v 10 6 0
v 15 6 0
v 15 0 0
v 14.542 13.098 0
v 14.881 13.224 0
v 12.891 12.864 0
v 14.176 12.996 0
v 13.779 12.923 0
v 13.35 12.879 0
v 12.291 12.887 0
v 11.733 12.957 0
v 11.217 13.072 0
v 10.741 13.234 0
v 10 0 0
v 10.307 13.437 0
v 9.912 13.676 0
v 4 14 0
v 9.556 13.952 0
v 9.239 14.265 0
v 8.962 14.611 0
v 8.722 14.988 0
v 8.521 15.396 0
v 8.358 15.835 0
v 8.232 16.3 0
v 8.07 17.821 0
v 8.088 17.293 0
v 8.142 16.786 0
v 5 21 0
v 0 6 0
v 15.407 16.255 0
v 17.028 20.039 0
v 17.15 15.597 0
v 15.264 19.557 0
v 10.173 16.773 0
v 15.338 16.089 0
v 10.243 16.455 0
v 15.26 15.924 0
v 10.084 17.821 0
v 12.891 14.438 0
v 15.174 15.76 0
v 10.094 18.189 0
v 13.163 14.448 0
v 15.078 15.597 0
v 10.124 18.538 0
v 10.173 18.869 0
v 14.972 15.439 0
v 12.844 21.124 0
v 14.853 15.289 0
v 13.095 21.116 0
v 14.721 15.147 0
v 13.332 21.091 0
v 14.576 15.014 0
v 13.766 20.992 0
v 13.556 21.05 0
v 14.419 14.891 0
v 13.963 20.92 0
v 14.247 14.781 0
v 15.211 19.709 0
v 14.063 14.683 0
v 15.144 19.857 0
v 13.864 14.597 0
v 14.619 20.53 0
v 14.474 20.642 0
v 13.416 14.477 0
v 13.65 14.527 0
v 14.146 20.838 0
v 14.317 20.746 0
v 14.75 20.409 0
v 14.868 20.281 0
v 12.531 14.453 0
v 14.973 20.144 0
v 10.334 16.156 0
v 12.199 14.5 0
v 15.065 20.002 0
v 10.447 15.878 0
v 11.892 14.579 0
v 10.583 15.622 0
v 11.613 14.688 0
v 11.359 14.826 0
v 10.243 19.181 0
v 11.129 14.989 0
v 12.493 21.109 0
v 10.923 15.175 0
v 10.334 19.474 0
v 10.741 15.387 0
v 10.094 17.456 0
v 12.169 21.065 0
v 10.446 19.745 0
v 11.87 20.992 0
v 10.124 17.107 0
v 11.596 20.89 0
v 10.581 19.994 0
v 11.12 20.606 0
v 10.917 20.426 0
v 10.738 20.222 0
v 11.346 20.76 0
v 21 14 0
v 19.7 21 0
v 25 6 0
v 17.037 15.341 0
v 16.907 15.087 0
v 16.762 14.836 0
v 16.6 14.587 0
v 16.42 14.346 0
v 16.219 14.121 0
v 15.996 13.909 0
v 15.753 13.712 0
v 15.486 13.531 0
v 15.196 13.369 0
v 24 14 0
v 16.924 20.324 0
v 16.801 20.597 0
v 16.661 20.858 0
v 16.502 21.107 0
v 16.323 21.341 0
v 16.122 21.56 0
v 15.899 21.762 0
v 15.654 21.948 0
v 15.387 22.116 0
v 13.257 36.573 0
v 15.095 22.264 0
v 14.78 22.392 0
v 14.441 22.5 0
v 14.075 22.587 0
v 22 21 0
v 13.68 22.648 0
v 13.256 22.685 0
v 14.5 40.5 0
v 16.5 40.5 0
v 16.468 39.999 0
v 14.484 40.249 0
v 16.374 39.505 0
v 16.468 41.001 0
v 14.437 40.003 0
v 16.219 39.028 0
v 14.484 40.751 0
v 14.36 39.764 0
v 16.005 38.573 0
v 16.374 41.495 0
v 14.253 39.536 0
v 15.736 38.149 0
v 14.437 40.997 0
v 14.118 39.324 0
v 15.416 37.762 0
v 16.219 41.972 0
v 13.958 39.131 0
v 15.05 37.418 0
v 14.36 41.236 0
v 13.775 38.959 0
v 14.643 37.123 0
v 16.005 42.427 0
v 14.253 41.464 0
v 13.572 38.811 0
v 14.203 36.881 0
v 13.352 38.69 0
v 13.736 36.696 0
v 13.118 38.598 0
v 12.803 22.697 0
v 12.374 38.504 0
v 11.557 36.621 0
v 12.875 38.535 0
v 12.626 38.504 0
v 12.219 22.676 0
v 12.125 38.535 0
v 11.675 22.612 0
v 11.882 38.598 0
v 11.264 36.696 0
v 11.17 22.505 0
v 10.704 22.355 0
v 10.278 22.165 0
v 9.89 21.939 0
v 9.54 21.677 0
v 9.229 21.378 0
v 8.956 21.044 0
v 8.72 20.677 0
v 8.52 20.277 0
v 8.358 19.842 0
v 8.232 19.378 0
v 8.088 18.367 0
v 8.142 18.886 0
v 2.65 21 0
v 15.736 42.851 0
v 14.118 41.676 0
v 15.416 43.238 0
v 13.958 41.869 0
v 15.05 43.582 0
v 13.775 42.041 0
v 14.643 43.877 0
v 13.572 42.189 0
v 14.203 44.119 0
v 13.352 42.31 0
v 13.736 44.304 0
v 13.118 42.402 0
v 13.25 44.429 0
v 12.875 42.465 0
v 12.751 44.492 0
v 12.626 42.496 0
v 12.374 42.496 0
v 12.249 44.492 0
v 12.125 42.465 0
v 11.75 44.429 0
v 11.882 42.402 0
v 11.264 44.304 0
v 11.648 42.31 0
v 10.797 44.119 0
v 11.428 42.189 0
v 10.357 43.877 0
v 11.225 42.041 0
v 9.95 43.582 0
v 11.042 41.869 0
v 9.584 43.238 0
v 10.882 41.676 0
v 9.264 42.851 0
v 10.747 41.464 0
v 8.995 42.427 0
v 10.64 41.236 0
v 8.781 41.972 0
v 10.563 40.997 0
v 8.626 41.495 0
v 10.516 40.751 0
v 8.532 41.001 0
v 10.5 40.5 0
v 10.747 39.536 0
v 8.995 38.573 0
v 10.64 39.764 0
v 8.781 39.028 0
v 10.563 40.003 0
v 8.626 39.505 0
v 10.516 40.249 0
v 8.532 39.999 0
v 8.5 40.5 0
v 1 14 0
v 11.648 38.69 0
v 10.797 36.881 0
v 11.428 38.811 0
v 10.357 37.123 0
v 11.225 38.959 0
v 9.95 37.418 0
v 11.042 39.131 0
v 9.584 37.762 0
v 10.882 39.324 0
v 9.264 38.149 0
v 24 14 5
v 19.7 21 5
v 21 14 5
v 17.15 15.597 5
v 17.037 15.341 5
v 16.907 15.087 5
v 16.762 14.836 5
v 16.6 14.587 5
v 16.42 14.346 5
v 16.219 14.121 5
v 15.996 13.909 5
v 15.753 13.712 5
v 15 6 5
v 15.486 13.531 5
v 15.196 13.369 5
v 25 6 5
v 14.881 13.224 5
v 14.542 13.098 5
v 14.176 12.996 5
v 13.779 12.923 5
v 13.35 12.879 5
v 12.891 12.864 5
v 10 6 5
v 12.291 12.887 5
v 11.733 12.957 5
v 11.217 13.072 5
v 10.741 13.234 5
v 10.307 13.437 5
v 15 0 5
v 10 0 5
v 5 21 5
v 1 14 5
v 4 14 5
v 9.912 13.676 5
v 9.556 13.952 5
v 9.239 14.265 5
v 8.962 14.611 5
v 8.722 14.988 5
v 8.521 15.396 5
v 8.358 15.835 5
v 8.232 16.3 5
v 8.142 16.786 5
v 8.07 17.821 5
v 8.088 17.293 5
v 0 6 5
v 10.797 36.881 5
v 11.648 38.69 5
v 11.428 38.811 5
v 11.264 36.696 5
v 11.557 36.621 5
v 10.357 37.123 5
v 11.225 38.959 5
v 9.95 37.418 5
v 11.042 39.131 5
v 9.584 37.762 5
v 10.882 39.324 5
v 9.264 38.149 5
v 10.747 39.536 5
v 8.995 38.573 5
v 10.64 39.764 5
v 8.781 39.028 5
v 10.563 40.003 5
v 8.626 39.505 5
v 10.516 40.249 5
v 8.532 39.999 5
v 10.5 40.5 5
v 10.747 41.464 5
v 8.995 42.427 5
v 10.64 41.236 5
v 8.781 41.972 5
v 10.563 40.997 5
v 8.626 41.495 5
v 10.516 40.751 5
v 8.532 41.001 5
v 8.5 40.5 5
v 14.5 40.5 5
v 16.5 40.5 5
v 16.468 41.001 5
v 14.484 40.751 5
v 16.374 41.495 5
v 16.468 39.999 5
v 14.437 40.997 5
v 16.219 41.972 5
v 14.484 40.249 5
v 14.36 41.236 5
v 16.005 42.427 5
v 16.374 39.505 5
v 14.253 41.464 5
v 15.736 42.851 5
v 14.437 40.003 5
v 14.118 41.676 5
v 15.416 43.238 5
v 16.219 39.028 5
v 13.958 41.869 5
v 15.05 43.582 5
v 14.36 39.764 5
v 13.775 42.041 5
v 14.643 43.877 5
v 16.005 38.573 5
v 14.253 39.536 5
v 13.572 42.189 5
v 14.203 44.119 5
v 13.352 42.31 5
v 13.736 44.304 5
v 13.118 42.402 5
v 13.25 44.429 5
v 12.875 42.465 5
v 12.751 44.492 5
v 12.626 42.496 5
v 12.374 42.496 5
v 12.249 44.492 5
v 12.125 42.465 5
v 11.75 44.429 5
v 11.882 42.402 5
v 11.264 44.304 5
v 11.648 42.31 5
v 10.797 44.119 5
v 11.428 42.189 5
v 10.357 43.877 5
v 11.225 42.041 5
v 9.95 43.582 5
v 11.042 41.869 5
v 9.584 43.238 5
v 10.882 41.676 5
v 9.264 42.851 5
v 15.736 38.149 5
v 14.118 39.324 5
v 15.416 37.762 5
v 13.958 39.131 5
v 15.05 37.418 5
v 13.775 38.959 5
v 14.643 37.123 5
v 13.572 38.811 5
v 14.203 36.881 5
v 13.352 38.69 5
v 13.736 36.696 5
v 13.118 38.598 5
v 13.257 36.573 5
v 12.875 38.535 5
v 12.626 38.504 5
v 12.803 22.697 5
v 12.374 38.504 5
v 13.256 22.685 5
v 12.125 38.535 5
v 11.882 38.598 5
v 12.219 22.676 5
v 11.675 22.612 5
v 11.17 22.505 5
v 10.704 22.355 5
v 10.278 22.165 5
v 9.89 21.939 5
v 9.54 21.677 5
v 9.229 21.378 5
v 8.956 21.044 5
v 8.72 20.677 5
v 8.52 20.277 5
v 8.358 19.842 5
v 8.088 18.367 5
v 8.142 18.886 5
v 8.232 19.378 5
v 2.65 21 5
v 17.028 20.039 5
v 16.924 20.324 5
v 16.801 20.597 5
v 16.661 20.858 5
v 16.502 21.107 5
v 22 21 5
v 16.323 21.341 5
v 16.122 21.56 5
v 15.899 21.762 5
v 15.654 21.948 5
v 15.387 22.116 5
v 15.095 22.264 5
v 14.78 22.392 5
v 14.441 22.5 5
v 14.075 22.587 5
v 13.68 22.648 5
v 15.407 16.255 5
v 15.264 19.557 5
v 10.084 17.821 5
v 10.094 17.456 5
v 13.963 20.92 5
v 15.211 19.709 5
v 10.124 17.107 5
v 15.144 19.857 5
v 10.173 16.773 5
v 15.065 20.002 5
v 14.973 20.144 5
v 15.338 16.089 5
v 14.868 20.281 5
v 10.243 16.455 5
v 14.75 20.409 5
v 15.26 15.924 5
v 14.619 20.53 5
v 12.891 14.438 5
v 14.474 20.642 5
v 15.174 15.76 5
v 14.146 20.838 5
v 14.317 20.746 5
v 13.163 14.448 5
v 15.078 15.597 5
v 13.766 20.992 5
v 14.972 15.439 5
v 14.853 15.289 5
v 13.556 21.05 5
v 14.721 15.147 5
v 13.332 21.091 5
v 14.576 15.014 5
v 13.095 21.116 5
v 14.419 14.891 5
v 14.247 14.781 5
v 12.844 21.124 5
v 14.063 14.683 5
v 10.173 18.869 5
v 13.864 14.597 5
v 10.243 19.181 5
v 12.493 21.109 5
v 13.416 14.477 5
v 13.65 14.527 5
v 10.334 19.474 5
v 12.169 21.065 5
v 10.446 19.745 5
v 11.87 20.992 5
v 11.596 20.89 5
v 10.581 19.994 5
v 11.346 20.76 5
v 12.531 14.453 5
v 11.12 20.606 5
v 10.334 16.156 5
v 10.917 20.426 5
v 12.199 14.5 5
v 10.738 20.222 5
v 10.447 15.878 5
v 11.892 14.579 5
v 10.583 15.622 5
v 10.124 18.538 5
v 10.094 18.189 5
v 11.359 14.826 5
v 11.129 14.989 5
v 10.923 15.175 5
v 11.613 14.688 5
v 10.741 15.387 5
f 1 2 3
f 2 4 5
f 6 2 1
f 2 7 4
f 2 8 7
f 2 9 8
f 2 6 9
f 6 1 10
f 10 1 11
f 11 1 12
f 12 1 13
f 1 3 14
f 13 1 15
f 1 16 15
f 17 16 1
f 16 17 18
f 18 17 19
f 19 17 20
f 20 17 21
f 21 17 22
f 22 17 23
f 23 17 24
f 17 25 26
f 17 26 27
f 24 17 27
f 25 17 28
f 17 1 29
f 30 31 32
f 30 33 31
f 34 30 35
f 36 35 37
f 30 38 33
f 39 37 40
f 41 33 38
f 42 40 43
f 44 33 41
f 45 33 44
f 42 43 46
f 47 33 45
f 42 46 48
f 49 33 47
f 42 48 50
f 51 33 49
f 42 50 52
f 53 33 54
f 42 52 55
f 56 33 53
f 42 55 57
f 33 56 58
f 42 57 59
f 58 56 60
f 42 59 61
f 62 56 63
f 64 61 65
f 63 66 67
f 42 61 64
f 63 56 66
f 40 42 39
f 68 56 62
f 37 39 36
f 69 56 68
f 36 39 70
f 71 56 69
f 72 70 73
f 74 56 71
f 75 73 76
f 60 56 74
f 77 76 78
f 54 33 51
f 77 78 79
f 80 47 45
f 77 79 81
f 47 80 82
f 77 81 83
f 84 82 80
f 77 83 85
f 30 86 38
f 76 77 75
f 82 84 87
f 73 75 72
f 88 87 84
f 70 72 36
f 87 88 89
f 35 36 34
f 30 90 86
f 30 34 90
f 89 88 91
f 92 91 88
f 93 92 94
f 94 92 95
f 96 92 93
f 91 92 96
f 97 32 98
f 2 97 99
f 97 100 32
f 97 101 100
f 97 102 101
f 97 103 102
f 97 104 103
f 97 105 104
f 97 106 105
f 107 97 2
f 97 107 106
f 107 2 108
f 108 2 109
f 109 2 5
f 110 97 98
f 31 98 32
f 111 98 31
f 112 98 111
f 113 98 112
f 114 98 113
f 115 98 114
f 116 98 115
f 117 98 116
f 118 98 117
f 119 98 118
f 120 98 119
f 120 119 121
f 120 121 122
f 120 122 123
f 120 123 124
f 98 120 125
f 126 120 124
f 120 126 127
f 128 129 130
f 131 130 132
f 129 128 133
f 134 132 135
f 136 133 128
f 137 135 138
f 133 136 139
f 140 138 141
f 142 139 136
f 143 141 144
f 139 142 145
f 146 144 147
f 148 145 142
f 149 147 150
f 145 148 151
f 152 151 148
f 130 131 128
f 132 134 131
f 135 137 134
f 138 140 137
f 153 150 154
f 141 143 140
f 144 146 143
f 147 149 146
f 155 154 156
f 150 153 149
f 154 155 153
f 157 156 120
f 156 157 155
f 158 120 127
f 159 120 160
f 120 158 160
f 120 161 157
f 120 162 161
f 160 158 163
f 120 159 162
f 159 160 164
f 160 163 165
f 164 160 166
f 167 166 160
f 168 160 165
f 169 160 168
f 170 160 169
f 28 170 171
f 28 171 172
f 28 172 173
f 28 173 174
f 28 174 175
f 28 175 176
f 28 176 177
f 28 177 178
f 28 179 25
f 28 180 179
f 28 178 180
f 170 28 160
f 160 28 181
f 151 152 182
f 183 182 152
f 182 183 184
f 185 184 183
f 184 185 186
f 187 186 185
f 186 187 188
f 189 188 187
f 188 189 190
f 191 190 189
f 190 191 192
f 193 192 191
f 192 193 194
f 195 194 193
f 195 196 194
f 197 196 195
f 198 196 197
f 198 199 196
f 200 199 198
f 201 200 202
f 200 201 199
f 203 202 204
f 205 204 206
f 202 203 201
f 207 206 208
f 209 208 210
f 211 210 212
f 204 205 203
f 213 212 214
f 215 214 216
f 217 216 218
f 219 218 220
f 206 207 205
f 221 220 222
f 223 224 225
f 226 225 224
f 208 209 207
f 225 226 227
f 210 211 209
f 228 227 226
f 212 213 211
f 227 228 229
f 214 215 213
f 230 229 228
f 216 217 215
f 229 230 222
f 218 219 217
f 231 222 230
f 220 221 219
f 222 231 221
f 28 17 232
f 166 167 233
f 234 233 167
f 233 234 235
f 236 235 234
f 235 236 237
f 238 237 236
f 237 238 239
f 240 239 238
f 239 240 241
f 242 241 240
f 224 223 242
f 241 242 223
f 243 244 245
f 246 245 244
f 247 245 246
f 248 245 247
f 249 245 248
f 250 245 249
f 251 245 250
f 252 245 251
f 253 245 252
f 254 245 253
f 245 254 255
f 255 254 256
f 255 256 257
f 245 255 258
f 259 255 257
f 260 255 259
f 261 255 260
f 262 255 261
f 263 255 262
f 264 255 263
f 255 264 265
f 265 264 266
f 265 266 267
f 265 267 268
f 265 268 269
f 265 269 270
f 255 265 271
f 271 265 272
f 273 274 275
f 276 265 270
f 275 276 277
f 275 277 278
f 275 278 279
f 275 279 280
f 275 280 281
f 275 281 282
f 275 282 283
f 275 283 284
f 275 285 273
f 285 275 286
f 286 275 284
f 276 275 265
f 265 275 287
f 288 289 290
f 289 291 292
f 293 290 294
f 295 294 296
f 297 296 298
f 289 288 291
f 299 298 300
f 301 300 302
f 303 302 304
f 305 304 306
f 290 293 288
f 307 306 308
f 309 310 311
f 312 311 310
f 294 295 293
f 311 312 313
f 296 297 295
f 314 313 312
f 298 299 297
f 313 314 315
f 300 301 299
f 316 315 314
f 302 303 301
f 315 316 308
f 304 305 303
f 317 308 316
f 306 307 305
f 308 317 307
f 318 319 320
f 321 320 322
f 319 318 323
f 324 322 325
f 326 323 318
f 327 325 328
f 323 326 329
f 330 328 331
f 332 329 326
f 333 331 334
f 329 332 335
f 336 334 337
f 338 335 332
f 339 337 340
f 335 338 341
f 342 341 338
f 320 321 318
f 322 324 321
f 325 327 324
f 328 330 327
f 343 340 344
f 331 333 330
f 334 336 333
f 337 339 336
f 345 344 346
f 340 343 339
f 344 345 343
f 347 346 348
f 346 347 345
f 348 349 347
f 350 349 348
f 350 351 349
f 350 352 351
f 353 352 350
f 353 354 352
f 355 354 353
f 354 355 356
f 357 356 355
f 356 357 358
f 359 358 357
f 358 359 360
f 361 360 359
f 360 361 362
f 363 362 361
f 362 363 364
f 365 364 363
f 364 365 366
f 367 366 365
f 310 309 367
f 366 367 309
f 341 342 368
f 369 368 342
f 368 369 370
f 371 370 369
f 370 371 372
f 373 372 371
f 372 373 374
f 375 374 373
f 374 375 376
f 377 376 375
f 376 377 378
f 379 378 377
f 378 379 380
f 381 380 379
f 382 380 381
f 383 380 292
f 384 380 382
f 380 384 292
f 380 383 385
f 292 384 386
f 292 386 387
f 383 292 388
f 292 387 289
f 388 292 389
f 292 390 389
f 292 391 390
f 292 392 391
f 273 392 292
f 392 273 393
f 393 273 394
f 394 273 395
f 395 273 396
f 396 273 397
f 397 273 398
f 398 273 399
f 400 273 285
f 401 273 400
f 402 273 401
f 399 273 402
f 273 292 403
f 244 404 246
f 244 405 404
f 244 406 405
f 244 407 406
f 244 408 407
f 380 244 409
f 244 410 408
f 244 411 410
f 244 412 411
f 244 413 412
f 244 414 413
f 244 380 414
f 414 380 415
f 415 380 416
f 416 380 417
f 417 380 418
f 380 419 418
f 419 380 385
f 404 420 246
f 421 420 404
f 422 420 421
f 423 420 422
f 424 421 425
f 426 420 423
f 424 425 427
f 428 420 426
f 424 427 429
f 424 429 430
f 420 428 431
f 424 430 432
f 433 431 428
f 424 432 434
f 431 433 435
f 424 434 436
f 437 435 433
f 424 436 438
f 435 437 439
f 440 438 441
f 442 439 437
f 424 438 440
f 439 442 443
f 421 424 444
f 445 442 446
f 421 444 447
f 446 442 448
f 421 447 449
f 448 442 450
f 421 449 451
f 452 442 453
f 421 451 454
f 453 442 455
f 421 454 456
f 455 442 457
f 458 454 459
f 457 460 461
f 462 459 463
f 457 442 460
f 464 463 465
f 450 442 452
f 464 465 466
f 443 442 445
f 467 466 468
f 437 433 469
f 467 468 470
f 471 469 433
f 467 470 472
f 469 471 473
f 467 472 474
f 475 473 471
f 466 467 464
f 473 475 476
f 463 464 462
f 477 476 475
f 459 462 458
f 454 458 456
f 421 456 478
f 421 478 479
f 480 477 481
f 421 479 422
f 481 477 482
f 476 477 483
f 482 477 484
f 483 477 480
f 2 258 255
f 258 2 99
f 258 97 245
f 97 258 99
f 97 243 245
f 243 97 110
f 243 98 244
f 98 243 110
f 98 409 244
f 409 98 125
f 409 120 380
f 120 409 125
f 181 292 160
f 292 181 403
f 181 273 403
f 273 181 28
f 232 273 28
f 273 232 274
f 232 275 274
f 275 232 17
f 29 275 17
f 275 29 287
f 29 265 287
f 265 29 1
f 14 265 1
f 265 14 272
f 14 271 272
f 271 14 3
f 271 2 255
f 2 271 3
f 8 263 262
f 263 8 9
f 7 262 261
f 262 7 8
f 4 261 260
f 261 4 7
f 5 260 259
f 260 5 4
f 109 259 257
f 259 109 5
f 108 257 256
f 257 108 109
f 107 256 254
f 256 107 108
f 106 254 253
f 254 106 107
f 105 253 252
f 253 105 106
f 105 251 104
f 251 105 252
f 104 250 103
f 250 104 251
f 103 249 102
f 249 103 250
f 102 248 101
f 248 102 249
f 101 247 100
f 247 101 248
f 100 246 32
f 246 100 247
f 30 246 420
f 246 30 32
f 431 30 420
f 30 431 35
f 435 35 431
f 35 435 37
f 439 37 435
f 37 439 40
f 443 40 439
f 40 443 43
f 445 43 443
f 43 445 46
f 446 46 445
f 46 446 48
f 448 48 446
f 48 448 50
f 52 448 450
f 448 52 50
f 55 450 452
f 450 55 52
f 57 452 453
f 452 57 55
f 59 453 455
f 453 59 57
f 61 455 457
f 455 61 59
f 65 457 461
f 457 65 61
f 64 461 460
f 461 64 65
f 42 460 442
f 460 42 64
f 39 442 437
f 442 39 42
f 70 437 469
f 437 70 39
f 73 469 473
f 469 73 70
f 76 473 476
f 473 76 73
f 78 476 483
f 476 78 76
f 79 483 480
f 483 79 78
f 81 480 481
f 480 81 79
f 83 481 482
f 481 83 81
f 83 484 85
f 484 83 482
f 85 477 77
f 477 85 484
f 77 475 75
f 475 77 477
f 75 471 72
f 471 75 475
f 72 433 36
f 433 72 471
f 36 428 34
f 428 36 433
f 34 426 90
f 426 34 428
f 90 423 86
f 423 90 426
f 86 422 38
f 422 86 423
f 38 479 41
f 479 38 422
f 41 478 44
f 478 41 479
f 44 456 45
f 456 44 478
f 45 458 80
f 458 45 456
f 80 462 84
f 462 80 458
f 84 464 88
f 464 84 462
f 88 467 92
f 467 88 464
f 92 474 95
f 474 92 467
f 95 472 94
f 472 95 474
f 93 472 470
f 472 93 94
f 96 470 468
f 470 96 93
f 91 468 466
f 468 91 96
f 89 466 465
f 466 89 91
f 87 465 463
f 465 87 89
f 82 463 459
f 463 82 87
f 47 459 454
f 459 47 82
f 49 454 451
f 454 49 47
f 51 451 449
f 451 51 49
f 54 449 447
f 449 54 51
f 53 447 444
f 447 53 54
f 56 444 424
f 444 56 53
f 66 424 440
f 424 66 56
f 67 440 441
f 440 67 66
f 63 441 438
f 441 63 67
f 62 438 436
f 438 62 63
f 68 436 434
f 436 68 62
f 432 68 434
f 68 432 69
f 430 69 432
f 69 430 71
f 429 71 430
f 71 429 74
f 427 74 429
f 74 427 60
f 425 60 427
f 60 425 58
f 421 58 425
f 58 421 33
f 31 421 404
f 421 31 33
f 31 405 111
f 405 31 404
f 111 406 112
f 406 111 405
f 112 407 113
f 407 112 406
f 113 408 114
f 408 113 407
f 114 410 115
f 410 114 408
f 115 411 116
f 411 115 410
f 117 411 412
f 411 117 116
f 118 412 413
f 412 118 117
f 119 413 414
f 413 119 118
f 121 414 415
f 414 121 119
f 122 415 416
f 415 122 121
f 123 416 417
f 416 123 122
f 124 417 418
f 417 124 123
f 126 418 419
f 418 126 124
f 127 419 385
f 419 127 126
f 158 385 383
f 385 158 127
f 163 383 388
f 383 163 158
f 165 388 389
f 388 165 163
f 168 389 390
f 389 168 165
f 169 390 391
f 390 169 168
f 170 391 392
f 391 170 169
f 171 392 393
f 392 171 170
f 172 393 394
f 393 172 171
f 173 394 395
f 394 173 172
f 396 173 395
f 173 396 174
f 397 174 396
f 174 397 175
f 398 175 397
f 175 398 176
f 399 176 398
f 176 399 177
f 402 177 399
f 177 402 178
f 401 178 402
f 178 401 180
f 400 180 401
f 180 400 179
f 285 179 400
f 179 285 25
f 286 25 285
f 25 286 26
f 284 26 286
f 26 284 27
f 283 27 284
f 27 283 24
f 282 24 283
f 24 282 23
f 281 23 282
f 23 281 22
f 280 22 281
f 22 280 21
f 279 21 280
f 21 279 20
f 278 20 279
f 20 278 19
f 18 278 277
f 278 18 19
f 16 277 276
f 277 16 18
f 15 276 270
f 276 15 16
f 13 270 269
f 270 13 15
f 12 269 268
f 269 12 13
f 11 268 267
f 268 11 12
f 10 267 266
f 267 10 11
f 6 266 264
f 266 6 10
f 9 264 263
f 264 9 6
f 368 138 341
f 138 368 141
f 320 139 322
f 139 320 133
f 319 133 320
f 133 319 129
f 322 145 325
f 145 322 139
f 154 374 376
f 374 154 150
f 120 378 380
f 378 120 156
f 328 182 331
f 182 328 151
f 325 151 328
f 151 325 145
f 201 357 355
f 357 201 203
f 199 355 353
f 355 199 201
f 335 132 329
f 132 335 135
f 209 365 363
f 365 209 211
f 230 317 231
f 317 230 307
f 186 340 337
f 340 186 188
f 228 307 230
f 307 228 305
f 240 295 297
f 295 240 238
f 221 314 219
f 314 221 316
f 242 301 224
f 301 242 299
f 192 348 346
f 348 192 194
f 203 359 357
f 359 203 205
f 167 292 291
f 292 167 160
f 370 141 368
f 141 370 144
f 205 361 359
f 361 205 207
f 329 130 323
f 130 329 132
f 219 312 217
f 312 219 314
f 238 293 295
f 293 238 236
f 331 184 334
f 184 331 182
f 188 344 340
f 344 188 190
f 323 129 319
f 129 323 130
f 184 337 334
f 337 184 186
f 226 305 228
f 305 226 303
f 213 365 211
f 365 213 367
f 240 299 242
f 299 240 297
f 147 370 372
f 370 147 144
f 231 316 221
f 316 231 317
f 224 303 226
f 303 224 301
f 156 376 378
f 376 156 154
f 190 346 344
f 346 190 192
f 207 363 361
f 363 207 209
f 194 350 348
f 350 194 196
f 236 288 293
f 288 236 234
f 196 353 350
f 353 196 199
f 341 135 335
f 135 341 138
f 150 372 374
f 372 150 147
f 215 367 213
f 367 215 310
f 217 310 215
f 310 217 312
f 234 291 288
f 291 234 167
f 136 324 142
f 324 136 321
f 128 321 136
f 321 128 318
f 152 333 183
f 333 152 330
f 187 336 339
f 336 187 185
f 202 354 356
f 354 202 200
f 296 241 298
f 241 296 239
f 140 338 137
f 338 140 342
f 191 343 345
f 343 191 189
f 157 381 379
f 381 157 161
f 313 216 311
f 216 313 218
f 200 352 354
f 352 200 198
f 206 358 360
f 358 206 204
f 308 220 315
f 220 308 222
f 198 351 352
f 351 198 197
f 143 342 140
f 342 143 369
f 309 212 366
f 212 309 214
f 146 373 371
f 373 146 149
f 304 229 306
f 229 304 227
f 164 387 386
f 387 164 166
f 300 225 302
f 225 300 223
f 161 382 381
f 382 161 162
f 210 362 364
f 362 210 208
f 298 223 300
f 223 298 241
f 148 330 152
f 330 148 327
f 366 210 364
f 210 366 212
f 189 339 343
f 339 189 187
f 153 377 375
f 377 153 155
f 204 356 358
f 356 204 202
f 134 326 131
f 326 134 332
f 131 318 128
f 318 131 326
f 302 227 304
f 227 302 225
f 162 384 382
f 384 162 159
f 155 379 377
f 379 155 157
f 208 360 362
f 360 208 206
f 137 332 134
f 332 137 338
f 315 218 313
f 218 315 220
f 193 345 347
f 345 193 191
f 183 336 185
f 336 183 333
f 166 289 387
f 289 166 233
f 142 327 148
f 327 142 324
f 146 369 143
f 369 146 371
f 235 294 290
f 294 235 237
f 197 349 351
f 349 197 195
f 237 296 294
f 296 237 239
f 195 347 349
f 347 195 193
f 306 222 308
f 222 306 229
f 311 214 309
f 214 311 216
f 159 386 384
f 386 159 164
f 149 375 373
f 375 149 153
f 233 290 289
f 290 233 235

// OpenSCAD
//CUSTOMIZER VARIABLES
character = "C";	//	[A,B,C,D,E,F,G,H,I,J,K,L,M,N,O,P,Q,R,S,T,U,V,W,X,Y,Z]
char_pos = 7.5; // Character Position [6:9]
//CUSTOMIZER VARIABLES END

difference(){

linear_extrude(height = 5)
polygon(points = [ [10, 0], [10, 6],[0, 6],[4, 14],[1, 14],[5, 21],[2.65, 21],[12.4, 38.1],[12.4, 38.1],[22, 21],[19.7, 21],[24, 14],[21, 14],[25, 6],[15, 6],[15, 0]]);
    
    
    



translate([char_pos,13,0])    
linear_extrude(height = 5)
   text(character,font="Arial:style=Bold");
}
translate([12.5,40.5,0])
difference(){
cylinder(r=4,h=5,$fn=50);
cylinder(r=2,h=5,$fn=50);
}
